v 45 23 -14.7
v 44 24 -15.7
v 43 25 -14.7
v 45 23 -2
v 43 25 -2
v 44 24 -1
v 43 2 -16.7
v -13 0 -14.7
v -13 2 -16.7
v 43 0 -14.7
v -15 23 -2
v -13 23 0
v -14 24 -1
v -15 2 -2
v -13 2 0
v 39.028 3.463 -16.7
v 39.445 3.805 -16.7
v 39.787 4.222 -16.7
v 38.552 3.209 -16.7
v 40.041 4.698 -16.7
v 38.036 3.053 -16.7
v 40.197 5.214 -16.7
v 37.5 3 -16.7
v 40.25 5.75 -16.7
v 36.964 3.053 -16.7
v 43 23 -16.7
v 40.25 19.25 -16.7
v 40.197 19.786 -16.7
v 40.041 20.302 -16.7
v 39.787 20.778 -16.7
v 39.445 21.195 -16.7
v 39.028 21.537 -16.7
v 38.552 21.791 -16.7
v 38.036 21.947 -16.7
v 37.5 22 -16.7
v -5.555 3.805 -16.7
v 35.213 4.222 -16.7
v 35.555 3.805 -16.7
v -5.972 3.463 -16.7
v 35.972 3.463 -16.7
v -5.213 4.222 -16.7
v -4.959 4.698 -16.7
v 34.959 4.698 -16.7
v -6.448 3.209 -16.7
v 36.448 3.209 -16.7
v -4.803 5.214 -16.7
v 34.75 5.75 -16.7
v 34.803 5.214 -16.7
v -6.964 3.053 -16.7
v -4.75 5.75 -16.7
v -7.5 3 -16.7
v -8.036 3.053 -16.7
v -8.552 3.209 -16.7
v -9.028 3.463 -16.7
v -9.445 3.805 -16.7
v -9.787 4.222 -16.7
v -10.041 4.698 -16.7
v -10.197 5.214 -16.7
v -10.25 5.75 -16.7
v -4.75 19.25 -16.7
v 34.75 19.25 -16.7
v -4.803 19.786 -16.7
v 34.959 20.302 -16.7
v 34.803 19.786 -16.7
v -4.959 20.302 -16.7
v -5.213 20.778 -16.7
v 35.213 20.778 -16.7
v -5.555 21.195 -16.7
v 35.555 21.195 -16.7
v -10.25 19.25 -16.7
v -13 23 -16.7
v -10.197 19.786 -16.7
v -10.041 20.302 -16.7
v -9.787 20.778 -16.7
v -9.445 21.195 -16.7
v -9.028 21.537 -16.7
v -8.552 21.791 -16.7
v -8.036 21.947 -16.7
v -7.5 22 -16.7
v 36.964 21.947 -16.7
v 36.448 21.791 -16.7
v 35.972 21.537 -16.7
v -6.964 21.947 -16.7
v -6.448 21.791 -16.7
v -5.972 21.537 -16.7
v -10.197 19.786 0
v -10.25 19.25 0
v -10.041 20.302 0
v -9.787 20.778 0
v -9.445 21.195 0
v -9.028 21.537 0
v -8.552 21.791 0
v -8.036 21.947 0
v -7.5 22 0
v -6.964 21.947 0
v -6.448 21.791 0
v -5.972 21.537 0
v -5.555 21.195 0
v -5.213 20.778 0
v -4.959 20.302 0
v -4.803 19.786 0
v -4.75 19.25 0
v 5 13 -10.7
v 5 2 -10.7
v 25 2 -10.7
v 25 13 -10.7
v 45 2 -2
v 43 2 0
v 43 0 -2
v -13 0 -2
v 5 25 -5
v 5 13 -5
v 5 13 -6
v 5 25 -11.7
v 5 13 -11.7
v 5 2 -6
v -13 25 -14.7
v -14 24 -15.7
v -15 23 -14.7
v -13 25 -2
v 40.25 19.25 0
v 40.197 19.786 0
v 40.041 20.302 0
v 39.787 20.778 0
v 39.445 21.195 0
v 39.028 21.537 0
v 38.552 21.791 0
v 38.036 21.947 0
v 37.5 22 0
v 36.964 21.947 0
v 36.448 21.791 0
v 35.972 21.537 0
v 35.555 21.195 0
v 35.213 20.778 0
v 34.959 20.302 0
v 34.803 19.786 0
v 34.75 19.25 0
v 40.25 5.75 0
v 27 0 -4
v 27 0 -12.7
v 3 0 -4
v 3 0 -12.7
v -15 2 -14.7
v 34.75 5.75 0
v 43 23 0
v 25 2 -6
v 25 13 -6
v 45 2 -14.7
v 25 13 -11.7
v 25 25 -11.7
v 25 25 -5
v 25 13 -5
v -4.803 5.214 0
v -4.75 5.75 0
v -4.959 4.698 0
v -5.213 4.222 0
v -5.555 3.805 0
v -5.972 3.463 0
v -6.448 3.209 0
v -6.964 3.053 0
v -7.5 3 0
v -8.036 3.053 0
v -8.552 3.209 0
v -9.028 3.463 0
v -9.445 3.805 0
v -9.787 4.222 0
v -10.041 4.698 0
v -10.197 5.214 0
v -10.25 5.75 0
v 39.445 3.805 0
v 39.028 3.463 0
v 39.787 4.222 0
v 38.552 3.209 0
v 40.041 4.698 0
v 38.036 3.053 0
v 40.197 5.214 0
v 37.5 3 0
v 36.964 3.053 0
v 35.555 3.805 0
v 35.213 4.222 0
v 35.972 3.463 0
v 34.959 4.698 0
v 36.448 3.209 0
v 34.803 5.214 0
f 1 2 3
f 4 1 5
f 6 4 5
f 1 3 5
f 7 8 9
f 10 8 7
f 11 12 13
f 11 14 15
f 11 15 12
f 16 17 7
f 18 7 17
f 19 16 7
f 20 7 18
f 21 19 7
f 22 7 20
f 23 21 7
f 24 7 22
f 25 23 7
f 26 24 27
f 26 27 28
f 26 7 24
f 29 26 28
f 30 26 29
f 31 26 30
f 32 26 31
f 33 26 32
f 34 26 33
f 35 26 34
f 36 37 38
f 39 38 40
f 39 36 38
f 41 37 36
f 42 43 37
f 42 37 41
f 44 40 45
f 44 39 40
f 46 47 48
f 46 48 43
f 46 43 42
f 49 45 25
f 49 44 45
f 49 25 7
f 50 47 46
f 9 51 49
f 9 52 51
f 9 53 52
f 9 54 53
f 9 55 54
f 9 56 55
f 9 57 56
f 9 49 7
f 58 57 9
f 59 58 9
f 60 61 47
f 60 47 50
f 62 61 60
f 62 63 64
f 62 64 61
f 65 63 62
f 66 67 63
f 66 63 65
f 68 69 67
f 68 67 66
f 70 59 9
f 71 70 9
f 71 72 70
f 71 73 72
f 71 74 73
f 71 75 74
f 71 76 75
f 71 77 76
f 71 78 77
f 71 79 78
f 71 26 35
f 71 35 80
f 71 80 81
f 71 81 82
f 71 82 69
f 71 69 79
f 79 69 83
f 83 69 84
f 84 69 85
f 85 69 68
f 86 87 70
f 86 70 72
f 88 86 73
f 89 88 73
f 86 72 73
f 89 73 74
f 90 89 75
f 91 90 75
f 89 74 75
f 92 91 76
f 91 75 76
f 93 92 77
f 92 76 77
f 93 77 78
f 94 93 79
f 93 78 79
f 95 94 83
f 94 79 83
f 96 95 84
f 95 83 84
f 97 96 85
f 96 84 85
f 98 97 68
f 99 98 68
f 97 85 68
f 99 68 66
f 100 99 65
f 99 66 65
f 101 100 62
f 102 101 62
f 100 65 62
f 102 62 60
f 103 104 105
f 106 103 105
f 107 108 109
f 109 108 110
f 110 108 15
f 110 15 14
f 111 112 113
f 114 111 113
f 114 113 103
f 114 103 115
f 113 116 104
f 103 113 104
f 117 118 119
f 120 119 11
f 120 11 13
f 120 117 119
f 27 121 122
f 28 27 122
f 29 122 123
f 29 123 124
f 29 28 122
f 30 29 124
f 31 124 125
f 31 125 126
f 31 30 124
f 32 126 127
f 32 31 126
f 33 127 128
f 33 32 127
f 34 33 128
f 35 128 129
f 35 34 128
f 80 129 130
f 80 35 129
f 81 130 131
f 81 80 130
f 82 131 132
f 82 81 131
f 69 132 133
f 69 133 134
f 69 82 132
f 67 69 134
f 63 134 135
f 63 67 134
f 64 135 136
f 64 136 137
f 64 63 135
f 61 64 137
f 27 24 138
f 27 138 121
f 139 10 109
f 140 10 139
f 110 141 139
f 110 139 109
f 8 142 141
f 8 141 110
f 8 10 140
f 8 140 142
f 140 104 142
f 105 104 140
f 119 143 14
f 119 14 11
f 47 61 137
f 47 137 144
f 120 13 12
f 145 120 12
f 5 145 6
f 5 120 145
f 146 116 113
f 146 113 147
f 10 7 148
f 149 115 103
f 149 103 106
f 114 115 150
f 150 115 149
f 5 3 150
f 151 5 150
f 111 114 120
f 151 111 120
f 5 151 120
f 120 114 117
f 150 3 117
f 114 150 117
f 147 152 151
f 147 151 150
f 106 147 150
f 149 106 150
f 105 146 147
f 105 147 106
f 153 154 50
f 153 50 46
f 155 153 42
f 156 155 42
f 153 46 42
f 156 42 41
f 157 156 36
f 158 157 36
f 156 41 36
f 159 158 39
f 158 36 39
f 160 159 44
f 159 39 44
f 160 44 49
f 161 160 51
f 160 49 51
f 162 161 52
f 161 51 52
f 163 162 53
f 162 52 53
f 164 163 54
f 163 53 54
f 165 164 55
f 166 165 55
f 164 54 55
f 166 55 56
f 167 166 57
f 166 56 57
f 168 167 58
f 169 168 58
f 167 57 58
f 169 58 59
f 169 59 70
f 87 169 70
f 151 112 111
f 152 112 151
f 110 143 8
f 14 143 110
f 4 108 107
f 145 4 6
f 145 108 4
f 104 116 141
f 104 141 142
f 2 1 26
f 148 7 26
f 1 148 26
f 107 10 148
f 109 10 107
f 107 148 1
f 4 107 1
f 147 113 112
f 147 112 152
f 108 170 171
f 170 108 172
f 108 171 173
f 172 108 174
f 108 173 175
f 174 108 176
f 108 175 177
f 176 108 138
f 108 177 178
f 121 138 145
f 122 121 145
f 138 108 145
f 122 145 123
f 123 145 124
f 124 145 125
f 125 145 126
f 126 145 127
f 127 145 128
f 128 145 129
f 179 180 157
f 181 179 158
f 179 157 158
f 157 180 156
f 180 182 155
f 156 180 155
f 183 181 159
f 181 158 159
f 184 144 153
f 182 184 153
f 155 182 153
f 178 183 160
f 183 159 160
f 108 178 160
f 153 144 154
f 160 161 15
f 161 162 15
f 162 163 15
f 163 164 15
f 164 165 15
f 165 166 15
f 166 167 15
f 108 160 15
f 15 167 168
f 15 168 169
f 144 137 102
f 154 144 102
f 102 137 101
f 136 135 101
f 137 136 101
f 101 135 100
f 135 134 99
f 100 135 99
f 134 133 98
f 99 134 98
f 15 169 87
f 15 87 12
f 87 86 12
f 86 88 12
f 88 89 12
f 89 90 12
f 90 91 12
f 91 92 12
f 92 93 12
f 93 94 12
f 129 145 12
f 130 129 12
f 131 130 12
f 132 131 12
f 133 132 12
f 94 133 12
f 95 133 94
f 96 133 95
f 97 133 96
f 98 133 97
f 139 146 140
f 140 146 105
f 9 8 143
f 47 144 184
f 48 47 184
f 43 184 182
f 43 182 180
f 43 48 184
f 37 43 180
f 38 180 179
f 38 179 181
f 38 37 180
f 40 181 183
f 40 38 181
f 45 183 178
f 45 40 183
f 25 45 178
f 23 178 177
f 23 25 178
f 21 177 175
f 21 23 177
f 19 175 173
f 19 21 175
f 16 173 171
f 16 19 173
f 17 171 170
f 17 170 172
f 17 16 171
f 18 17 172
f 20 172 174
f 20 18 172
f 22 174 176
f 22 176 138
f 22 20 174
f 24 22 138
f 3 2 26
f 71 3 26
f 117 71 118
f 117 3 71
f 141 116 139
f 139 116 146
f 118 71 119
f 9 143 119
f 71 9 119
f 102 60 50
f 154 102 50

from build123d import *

# Parameters (mm, degrees)
SKETCH1_W           = 30
SKETCH1_H           = 16.7
SKETCH1_W_2         = 20
SKETCH1_H_2         = 6.7
BOSS_EXTRUDE1_DEPTH = 25
SKETCH1_3_W         = 20
SKETCH1_3_H         = 1
BOSS_EXTRUDE2_DEPTH = 13
SKETCH2_W           = 15
SKETCH2_H           = 25
BOSS_EXTRUDE3_DEPTH = 16.7
CHAMFER1_SIZE       = 2
CHAMFER2_SIZE       = 2


with BuildPart() as part:
    # Sketch1 → Boss-Extrude1 (new body)
    with BuildSketch(Plane(origin=(0, 0, 0), x_dir=(1, 0, 0), z_dir=(0, 1, 0))):
        with Locations((15, 8.35)):
            Rectangle(SKETCH1_W, SKETCH1_H)
        with Locations((15, 8.35)):
            Rectangle(SKETCH1_W_2, SKETCH1_H_2, mode=Mode.SUBTRACT)
    extrude(amount=BOSS_EXTRUDE1_DEPTH)

    # Sketch1<3> → Boss-Extrude2 (add)
    with BuildSketch(Plane(origin=(0, 0, 0), x_dir=(1, 0, 0), z_dir=(0, 1, 0))):
        with Locations((15, 11.2)):
            Rectangle(SKETCH1_3_W, SKETCH1_3_H)
        with Locations((15, 5.5)):
            Rectangle(SKETCH1_3_W, SKETCH1_3_H)
    extrude(amount=BOSS_EXTRUDE2_DEPTH)

    # Sketch2 → Boss-Extrude3 (add, through all)
    # profile 1 of 2: a face of its own
    with BuildSketch(Plane(origin=(0, 0, -16.7), x_dir=(-1, 0, 0), z_dir=(0, 0, -1))):
        with Locations((-37.5, 12.5)):
            Rectangle(SKETCH2_W, SKETCH2_H)
        with BuildLine():
            Line((-40.25, 5.75), (-40.25, 19.25))
            ThreePointArc((-40.25, 19.25), (-37.5, 22), (-34.75, 19.25))
            Line((-34.75, 19.25), (-34.75, 5.75))
            ThreePointArc((-34.75, 5.75), (-37.5, 3), (-40.25, 5.75))
        make_face(mode=Mode.SUBTRACT)
    # profile 2 of 2: a face of its own
    with BuildSketch(Plane(origin=(0, 0, -16.7), x_dir=(-1, 0, 0), z_dir=(0, 0, -1))):
        with Locations((7.5, 12.5)):
            Rectangle(SKETCH2_W, SKETCH2_H)
        with BuildLine():
            Line((10.25, 5.75), (10.25, 19.25))
            ThreePointArc((10.25, 19.25), (7.5, 22), (4.75, 19.25))
            Line((4.75, 19.25), (4.75, 5.75))
            ThreePointArc((4.75, 5.75), (7.5, 3), (10.25, 5.75))
        make_face(mode=Mode.SUBTRACT)
    extrude(amount=-BOSS_EXTRUDE3_DEPTH)

    # Chamfer1
    chamfer1_edges = [part.edges().sort_by_distance(p)[0] for p in [
        (15, 25, -16.7),
        (45, 25, -8.35),
        (-15, 25, -8.35),
        (15, 25, 0),
    ]]
    chamfer(chamfer1_edges, length=CHAMFER1_SIZE)

    # Chamfer2
    chamfer2_edges = [part.edges().sort_by_distance(p)[0] for p in [
        (45, 11.5, -16.7),
        (45, 11.5, 0),
        (15, 0, -16.7),
        (15, 0, 0),
        (25, 0, -8.35),
        (5, 0, -8.35),
        (15, 0, -10.7),
        (15, 0, -6),
        (45, 0, -8.35),
        (-15, 11.5, 0),
        (-15, 0, -8.35),
        (-15, 11.5, -16.7),
    ]]
    chamfer(chamfer2_edges, length=CHAMFER2_SIZE)


solid = part.part
